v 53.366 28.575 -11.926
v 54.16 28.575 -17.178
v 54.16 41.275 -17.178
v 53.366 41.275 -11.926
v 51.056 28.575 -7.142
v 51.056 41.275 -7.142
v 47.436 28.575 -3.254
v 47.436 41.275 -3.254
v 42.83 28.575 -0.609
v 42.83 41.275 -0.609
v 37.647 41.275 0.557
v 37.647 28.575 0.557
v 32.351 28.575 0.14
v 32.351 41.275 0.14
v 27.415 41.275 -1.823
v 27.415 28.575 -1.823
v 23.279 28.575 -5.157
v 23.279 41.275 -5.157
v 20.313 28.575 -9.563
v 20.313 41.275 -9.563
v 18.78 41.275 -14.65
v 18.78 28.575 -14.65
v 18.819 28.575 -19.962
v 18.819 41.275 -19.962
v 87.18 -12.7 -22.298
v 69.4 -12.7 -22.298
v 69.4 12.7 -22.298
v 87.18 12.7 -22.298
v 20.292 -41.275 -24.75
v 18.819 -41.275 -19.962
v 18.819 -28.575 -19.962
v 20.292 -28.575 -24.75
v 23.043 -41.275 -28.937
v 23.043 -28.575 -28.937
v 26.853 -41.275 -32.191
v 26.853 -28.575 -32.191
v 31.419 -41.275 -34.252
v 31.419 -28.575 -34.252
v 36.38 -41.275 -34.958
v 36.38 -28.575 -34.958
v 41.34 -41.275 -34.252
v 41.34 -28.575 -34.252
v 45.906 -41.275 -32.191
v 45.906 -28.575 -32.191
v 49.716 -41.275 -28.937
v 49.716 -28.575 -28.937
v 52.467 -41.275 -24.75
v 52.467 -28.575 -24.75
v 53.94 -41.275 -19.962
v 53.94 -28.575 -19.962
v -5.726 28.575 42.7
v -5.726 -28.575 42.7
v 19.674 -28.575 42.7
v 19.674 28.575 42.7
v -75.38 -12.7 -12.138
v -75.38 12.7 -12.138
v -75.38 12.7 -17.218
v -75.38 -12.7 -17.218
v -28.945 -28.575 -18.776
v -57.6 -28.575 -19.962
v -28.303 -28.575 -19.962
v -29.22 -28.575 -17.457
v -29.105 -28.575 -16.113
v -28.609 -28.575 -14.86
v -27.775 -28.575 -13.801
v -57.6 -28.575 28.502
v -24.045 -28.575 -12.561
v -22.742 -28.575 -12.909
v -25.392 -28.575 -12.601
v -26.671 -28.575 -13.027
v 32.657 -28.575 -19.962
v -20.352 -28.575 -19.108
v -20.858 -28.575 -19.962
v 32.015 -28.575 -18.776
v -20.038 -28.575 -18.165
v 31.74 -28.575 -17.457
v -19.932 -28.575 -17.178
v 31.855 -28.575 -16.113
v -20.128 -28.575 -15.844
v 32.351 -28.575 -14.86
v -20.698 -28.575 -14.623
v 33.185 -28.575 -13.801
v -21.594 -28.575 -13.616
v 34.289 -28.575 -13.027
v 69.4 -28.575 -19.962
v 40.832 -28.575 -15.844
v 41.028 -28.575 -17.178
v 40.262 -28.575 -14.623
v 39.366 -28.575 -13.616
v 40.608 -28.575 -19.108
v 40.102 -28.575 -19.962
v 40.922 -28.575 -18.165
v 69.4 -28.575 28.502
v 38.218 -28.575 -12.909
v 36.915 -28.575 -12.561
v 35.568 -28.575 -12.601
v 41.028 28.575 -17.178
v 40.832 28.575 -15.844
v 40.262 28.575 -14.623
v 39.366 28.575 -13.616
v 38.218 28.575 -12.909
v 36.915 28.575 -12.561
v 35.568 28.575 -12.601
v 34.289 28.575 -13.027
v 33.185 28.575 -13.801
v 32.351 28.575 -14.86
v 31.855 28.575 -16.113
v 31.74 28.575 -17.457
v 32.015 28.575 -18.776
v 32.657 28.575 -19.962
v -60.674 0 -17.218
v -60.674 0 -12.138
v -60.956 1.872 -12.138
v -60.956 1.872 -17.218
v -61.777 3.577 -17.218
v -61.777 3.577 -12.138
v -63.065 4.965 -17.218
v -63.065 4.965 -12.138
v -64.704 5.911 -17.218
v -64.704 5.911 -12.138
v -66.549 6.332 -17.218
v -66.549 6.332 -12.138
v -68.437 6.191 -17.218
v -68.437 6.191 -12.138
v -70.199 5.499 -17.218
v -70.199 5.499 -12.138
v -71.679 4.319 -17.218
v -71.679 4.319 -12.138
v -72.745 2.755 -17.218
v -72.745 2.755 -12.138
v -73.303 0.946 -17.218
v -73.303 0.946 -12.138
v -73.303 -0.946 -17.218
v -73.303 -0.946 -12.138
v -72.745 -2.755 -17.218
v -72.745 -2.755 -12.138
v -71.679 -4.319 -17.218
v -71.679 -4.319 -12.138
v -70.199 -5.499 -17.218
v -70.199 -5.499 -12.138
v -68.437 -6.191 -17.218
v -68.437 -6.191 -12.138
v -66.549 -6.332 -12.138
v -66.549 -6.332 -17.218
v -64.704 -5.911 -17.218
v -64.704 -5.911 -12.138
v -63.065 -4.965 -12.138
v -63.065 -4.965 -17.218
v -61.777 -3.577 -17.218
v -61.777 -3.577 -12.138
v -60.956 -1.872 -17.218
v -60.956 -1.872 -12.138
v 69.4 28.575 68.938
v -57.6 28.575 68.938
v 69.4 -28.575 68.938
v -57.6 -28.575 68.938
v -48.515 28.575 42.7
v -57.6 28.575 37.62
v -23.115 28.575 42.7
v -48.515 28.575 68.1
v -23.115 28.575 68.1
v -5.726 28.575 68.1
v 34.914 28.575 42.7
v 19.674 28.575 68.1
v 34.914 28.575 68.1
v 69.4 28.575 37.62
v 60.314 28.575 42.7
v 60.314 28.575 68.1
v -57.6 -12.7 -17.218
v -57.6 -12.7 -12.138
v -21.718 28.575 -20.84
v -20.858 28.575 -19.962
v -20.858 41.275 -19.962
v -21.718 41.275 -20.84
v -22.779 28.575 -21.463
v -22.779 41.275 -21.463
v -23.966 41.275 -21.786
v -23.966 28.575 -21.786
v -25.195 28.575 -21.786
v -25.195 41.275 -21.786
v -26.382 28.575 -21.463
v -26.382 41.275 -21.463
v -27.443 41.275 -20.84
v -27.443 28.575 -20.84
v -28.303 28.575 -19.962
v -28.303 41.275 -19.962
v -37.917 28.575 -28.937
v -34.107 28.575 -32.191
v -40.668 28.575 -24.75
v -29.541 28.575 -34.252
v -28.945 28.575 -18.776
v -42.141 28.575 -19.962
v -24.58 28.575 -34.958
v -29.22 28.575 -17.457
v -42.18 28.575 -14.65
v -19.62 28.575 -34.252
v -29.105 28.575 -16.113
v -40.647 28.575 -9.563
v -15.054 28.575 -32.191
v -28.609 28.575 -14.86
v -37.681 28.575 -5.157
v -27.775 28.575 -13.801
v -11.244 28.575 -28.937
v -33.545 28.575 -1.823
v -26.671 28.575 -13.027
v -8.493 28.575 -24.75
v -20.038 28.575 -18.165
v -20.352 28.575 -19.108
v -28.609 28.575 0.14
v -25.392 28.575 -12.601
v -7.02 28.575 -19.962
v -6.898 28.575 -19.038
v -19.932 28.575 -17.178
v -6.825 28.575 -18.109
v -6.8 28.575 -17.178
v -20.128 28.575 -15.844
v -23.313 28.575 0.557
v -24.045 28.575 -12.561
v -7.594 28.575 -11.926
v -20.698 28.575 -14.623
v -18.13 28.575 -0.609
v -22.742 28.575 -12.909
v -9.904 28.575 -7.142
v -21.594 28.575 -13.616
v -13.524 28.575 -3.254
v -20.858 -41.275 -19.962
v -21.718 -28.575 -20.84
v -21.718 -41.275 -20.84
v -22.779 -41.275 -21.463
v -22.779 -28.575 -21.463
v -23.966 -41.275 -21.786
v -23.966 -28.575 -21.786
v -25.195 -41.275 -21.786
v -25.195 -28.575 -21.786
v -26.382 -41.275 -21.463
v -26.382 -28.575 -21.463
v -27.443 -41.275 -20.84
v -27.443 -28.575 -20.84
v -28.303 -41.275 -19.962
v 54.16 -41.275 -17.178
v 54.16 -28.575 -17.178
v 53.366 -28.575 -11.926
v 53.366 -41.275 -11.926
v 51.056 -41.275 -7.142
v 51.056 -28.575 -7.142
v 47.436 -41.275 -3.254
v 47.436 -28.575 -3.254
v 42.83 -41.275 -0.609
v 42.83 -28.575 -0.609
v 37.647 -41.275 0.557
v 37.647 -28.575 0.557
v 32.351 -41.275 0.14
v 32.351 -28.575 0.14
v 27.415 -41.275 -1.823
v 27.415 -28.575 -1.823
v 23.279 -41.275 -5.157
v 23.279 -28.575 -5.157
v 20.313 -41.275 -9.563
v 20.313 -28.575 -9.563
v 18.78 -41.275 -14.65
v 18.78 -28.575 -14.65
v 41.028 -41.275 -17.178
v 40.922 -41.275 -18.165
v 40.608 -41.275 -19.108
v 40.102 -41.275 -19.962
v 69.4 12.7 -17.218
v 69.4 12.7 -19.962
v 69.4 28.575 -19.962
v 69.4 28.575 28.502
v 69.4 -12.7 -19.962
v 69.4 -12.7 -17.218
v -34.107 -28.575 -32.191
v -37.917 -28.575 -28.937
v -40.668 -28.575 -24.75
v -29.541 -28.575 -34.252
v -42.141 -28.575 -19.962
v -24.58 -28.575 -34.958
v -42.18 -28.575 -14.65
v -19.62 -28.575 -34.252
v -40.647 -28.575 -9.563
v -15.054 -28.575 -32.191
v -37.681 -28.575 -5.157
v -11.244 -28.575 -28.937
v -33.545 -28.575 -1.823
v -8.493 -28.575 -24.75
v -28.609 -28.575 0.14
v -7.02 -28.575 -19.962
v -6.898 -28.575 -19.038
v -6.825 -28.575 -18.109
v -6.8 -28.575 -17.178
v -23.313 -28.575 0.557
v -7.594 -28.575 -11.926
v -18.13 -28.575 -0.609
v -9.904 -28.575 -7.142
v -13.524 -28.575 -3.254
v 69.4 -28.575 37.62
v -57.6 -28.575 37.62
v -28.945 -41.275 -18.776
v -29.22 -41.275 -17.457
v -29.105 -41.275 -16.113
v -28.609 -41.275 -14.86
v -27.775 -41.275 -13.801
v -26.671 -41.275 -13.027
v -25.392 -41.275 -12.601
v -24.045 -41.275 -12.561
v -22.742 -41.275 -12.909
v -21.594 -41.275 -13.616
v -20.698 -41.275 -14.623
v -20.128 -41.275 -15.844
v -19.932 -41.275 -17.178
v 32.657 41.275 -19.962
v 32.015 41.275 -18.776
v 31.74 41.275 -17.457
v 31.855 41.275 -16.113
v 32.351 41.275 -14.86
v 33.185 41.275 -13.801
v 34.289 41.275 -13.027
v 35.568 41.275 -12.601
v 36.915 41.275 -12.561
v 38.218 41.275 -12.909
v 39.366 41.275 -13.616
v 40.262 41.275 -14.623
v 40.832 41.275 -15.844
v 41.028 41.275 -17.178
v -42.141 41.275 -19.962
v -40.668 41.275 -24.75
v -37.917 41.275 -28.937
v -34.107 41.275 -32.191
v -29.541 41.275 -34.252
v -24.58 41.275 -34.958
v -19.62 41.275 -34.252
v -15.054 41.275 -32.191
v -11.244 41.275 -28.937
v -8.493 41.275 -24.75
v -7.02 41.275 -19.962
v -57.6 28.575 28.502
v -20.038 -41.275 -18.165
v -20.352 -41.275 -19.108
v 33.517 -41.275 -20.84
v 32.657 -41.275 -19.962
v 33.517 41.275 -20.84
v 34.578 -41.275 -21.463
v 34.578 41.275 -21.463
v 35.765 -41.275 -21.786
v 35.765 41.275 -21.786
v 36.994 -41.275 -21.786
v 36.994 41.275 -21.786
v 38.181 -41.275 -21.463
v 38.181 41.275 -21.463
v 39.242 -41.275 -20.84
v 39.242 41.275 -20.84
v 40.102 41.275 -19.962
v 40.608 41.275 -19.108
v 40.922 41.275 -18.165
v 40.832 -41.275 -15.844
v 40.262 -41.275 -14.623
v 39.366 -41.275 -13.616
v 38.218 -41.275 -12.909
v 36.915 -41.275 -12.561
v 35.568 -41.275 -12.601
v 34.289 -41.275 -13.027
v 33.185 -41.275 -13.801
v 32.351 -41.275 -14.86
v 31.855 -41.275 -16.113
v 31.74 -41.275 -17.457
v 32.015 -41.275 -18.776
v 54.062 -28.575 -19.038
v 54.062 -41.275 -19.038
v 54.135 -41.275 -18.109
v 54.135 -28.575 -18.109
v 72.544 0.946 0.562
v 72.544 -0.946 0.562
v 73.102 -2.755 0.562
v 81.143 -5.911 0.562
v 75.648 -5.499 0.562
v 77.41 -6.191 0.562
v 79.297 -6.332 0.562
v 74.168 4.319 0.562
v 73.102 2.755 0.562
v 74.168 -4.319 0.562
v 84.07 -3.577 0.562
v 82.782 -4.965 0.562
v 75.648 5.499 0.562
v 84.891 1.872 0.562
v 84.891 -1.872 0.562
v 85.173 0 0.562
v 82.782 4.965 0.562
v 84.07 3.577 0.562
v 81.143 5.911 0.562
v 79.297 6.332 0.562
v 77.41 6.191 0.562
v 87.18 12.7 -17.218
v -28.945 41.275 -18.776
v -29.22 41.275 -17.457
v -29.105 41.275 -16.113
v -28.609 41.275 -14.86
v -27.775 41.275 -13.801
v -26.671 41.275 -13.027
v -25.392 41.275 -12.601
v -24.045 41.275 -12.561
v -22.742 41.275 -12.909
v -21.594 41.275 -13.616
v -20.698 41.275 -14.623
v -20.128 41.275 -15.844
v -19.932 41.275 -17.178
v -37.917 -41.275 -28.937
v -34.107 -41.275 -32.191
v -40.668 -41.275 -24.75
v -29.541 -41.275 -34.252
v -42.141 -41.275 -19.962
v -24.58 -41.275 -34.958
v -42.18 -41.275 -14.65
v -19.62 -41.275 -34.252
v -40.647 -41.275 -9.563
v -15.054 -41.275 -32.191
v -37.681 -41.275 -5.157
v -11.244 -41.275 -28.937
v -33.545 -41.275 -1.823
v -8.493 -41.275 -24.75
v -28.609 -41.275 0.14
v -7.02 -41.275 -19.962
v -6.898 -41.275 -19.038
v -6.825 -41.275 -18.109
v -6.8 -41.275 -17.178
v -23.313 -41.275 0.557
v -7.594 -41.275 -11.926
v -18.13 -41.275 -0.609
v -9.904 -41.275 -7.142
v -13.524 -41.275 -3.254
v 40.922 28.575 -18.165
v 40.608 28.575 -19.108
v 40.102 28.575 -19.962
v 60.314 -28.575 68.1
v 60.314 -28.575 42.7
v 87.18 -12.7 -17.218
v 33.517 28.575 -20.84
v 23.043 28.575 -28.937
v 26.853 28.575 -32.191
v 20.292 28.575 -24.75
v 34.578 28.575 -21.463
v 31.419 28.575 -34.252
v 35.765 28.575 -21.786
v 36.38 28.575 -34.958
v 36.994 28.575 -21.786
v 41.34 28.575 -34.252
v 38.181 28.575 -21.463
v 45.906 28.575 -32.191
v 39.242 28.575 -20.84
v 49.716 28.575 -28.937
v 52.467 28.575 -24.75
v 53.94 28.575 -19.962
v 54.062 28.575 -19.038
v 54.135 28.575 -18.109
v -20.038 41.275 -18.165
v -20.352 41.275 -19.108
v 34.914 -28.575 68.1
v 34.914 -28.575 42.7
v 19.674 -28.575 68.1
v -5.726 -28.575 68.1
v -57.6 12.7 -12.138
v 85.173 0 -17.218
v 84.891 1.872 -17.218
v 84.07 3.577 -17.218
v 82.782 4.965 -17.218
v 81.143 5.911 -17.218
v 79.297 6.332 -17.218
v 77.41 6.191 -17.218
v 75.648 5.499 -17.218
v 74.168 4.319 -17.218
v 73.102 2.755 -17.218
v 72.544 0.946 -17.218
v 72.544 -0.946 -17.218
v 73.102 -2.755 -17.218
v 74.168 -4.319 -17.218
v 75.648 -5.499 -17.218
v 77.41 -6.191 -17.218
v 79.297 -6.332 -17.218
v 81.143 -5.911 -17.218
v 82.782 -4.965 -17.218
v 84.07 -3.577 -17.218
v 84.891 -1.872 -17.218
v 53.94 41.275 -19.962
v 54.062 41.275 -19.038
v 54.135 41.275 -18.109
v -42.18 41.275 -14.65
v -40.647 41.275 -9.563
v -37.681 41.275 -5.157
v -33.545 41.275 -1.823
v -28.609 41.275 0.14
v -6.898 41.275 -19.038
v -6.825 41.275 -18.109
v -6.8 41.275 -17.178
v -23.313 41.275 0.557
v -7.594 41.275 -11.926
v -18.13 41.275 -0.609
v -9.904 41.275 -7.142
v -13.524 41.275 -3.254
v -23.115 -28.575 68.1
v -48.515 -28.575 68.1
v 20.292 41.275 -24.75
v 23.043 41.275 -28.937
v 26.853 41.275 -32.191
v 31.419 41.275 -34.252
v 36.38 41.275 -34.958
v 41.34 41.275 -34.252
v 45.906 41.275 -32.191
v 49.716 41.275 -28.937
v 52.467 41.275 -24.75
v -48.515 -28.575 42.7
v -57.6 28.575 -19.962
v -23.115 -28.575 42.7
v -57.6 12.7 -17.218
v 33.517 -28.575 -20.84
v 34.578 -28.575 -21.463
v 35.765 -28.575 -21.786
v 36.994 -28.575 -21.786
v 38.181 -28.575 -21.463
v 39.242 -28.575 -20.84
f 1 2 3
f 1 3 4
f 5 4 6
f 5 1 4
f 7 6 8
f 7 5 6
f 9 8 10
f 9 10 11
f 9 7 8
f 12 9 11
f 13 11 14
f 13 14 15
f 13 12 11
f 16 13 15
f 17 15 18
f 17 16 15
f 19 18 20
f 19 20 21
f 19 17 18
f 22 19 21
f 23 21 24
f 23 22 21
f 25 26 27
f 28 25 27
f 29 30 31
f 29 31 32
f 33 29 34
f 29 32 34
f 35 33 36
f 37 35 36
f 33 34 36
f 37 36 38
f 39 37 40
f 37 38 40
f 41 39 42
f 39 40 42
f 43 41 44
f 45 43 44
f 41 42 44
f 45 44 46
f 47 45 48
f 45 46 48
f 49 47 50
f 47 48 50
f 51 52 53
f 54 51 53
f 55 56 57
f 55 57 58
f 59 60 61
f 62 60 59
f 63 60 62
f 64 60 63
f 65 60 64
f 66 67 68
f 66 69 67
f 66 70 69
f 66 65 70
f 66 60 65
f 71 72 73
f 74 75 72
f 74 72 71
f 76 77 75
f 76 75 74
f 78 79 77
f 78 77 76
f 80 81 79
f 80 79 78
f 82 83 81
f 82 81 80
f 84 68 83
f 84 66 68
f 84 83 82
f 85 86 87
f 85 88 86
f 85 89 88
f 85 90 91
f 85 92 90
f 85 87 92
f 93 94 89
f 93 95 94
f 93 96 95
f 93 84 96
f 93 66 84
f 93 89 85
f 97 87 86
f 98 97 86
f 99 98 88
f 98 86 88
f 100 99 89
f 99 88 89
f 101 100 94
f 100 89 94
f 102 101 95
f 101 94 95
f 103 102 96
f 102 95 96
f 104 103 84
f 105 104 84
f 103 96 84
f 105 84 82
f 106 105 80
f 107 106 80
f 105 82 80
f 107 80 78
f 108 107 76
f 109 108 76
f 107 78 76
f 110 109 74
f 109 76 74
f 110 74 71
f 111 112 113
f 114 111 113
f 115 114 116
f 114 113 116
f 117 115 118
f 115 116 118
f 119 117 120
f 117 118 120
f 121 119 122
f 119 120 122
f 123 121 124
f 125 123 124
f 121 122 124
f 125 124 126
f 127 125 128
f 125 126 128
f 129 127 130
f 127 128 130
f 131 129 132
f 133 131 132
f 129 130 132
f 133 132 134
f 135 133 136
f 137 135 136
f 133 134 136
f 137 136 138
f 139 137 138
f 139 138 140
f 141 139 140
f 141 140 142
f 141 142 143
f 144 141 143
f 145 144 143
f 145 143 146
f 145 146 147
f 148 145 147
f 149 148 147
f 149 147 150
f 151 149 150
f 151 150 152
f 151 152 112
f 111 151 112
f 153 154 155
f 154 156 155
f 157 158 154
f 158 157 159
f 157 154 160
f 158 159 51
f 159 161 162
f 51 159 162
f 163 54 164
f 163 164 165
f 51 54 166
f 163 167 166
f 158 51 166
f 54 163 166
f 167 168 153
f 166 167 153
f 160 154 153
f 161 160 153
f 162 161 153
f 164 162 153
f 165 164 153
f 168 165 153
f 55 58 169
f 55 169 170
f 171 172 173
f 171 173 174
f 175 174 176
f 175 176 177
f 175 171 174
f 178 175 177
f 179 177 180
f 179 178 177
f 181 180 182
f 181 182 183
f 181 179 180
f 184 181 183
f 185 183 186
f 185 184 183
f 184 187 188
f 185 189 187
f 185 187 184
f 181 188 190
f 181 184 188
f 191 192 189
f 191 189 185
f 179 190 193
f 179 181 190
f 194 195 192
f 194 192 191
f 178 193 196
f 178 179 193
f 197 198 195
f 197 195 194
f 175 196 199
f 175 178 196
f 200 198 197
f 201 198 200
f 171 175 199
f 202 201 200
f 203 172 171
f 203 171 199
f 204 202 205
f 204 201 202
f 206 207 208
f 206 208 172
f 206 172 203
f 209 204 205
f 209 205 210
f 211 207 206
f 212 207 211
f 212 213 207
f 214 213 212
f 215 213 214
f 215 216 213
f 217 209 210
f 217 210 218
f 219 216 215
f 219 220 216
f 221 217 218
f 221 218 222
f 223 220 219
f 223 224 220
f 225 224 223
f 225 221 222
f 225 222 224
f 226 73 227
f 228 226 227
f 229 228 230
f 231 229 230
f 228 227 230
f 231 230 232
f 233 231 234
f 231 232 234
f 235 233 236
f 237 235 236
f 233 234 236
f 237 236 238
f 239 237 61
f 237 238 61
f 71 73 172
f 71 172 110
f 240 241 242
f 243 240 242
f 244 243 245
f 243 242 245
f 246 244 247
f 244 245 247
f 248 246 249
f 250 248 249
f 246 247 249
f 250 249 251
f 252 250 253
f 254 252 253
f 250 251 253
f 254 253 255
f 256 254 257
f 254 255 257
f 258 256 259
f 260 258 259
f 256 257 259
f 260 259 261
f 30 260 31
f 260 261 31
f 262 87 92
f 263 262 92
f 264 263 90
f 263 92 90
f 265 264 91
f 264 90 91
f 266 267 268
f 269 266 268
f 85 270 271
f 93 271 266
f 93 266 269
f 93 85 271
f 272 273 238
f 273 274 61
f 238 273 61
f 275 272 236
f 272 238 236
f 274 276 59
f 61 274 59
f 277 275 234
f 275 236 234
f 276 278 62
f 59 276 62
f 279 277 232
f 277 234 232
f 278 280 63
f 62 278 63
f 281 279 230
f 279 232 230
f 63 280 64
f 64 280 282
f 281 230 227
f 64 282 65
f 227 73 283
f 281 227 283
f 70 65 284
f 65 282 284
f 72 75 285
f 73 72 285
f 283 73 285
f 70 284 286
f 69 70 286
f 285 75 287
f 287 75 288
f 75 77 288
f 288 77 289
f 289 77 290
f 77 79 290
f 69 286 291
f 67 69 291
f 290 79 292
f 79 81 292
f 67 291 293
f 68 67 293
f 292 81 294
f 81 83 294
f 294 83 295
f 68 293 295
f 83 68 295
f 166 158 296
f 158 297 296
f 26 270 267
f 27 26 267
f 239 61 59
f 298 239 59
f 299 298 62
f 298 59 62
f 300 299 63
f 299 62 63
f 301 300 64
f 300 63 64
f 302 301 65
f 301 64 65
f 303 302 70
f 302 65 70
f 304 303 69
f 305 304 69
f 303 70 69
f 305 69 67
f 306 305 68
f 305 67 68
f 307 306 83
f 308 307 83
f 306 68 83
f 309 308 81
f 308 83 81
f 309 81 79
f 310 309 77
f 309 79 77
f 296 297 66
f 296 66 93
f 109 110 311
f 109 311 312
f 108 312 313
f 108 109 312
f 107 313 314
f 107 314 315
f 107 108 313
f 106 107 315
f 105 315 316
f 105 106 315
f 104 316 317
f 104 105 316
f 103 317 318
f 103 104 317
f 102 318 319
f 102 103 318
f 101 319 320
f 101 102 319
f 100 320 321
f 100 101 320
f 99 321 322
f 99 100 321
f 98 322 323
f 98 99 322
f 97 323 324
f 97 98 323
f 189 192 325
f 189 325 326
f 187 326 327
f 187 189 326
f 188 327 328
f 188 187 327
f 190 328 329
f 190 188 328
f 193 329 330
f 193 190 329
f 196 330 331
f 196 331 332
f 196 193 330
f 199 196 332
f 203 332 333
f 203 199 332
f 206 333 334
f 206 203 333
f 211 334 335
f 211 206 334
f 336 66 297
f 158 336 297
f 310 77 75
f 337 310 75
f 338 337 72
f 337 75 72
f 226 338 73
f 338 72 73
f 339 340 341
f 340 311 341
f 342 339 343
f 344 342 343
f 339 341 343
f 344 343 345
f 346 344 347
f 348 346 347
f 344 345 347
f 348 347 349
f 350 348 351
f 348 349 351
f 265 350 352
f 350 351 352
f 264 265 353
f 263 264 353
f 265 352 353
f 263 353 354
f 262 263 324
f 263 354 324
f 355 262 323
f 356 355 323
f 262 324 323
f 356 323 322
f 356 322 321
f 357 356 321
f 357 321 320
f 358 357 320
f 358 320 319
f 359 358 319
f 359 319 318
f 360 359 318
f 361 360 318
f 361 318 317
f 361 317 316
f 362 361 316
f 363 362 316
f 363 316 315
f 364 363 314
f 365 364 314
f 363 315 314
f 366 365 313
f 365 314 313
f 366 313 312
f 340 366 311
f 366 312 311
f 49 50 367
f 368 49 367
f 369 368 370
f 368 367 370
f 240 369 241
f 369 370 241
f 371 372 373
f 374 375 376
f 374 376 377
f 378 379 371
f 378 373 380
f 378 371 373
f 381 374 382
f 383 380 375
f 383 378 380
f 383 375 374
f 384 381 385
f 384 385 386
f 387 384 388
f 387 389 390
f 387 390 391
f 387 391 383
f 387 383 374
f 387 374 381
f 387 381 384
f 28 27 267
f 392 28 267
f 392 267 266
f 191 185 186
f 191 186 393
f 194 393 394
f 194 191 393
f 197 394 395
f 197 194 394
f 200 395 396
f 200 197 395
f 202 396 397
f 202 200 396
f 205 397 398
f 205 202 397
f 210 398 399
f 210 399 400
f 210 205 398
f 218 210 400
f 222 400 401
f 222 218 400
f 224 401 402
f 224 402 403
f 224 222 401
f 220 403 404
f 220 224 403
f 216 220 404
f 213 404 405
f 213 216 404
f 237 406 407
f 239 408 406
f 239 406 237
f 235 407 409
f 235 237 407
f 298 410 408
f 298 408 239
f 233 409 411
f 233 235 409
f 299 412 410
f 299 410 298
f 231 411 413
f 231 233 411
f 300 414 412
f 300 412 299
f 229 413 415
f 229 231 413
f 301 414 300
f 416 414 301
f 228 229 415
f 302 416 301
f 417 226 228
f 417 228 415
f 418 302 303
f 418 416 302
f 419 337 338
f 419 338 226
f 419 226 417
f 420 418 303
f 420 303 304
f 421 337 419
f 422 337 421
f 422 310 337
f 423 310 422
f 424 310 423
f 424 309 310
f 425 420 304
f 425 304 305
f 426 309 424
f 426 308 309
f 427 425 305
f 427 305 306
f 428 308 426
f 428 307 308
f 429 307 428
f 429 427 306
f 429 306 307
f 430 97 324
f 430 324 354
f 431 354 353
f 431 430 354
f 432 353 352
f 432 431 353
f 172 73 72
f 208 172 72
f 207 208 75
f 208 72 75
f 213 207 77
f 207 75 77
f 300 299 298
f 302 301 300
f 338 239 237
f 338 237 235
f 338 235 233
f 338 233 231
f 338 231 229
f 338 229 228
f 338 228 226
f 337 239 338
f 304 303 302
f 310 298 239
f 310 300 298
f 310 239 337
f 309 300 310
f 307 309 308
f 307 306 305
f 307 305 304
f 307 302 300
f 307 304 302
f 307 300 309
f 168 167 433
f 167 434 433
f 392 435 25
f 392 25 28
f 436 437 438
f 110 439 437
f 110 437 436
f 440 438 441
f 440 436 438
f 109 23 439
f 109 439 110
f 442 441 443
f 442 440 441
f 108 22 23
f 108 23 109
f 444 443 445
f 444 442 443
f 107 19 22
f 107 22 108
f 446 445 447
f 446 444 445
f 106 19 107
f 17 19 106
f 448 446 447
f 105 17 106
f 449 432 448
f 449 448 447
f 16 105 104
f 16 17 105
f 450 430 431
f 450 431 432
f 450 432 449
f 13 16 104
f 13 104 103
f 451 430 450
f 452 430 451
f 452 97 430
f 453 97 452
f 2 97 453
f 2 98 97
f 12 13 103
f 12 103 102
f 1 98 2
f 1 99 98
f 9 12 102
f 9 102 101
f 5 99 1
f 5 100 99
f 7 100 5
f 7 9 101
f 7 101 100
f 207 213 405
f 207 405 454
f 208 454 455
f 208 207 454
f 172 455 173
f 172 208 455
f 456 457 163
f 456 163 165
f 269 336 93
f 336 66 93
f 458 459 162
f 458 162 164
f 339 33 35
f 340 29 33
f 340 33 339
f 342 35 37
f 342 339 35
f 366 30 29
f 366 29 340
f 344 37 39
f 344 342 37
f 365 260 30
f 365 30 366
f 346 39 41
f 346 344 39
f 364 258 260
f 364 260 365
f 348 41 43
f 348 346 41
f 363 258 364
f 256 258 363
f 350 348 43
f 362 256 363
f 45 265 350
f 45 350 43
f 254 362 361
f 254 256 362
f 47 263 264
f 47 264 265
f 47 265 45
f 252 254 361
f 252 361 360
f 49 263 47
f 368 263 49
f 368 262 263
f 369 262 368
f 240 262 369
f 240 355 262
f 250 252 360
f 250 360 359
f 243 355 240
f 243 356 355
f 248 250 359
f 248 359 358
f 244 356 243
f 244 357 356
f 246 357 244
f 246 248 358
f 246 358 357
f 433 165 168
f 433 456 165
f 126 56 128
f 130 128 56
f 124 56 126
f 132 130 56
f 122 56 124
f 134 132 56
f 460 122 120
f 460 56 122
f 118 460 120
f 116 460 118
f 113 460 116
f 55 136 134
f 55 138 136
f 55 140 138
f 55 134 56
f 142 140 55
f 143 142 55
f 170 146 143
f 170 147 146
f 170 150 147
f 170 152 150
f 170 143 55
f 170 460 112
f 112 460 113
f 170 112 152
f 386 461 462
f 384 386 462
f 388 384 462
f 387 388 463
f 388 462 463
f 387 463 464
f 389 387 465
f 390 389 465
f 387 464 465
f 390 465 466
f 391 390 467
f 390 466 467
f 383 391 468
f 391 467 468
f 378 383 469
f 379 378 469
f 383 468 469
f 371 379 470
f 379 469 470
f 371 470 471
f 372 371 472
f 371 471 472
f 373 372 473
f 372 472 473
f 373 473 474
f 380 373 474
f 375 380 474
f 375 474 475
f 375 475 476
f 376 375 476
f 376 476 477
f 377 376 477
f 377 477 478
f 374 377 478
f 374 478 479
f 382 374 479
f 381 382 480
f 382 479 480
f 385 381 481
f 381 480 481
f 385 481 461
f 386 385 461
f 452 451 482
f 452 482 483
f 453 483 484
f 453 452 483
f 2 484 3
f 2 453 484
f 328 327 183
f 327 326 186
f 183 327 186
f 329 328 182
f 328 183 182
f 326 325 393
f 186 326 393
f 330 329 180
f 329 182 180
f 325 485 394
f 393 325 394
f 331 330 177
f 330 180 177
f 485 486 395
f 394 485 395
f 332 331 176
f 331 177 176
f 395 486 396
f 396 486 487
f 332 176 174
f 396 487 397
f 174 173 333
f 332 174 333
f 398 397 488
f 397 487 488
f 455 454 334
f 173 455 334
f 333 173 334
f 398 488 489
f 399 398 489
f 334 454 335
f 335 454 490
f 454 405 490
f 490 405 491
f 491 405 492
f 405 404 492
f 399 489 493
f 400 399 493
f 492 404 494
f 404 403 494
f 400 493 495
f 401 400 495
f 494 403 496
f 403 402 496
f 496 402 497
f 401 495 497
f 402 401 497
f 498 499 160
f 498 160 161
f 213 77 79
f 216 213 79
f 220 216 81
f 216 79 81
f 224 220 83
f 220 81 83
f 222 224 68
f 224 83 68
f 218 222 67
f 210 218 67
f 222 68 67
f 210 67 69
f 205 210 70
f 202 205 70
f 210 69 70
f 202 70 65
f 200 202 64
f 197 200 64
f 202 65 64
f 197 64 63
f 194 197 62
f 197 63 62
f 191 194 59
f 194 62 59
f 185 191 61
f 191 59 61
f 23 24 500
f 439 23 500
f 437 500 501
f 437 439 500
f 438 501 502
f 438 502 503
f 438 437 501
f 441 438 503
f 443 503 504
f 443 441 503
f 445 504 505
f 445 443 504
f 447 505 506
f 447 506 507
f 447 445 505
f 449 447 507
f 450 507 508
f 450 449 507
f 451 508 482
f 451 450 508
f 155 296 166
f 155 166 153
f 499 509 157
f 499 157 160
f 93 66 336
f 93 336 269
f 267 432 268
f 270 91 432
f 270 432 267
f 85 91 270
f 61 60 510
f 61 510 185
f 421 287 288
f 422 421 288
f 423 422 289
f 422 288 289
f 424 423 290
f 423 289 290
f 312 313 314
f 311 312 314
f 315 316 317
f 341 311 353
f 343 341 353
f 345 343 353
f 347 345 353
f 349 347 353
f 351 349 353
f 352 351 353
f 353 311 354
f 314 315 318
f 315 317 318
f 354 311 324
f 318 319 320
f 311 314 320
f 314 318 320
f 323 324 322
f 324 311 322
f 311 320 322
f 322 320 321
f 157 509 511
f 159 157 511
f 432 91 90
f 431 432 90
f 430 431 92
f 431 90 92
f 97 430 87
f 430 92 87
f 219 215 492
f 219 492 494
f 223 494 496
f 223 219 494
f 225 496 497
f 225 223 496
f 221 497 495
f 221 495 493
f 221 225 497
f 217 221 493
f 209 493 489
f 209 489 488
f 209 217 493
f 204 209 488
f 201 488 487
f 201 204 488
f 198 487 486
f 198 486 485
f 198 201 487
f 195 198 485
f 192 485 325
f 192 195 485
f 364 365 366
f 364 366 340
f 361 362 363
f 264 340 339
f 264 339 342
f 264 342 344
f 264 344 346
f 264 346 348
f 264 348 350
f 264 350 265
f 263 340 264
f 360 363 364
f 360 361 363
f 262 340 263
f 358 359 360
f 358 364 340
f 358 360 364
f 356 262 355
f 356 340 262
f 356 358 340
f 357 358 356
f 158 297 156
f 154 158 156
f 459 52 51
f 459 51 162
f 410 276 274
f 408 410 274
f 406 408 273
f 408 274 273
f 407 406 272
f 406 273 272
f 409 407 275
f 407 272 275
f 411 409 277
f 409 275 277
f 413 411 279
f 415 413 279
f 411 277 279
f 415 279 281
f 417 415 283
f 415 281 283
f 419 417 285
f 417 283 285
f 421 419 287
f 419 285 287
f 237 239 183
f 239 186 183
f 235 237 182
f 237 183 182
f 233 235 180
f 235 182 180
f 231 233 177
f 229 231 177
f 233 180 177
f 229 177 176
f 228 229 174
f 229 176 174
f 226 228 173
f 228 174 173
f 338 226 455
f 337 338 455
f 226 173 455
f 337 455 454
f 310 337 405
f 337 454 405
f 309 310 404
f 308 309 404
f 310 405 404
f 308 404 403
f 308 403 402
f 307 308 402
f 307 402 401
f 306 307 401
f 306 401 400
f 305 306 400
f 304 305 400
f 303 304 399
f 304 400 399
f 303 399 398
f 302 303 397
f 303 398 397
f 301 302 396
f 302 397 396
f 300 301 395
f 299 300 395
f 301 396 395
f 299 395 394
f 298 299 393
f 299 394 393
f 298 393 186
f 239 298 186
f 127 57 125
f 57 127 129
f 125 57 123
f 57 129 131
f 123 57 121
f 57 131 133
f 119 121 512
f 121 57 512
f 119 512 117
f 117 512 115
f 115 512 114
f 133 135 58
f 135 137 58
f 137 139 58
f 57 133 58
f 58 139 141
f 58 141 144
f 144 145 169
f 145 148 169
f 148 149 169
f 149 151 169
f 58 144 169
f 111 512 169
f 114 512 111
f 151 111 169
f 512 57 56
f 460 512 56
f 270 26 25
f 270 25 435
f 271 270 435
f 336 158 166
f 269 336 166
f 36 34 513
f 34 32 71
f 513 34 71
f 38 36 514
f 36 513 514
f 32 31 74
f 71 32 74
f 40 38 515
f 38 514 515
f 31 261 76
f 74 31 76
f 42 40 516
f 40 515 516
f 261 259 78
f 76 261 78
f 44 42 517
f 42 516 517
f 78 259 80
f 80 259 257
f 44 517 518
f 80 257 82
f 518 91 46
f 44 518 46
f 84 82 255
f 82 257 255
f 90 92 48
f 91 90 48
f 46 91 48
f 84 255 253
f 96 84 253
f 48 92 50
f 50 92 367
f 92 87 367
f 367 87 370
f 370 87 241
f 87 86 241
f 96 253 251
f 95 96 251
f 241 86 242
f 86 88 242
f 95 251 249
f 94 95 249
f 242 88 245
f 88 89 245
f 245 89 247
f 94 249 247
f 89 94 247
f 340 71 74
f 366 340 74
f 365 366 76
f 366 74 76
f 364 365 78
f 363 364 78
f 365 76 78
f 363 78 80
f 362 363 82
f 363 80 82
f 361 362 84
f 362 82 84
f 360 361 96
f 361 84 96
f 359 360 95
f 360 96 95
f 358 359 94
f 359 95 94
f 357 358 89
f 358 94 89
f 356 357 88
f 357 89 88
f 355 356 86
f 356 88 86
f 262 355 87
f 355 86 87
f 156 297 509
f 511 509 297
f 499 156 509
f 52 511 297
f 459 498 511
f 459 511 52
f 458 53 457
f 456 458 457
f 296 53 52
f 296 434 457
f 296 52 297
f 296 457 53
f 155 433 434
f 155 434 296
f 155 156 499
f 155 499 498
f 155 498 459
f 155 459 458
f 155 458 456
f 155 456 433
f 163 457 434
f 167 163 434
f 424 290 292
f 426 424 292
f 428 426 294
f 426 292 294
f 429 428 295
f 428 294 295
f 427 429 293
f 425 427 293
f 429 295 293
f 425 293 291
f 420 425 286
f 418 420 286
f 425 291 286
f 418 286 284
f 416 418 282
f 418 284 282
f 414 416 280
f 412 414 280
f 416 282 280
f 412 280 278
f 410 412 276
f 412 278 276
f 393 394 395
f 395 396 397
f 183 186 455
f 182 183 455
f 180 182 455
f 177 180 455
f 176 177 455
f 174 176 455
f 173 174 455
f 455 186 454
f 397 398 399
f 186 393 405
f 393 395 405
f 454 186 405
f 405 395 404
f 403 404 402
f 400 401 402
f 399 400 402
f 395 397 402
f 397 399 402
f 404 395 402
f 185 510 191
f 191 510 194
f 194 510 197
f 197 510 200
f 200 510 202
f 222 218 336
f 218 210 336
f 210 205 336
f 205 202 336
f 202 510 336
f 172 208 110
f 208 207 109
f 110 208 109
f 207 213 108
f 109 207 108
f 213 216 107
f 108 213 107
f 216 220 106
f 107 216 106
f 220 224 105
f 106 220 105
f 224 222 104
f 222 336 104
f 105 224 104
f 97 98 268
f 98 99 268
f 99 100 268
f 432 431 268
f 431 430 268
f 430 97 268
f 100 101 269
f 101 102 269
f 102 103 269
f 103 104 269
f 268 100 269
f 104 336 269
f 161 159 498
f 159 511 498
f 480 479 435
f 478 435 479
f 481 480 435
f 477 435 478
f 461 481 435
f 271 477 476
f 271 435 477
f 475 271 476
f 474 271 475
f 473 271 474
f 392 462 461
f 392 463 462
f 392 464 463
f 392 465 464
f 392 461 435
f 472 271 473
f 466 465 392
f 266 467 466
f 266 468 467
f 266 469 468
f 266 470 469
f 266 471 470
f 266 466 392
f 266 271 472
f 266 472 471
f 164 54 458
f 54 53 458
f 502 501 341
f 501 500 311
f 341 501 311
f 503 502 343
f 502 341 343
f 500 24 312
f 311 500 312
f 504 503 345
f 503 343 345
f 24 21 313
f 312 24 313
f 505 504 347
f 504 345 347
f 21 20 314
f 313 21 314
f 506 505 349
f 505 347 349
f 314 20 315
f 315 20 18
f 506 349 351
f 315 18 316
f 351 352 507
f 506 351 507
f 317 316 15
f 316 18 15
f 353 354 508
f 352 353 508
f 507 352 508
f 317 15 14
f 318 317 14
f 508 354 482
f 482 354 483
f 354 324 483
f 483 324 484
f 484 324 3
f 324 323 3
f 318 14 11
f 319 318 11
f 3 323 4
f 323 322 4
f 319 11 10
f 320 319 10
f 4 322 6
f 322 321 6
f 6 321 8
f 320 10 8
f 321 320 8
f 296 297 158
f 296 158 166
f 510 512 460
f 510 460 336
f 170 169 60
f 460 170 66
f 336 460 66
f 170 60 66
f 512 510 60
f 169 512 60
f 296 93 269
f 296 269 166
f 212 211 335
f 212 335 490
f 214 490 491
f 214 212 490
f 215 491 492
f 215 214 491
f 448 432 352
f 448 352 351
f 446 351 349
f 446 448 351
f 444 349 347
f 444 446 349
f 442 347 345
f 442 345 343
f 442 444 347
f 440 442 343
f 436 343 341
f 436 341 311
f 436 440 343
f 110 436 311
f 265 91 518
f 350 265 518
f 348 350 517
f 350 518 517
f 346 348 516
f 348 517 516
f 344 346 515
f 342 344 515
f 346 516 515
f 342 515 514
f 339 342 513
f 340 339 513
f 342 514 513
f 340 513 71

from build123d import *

# Parameters (mm, degrees)
F0_W          = 127
F0_H          = 31.3182
F0_W_2        = 25.4
F0_H_2        = 25.4
F1_DEPTH      = 28.575
F0_H_3        = 48.4632
F0_H_4        = 9.1186
F2_DEPTH      = 28.575
F4_DEPTH      = 12.7
F6_DEPTH      = 23.114
F7_DEPTH      = 82.804
F7_DEPTH_BACK = 76.2
F8_DEPTH      = 69.85
F8_DEPTH_BACK = 12.7
F9_W          = 25.4
F9_H          = 5.08
F10_DEPTH     = 17.78
F11_R         = 6.35
F12_DEPTH     = 17.78
F13_W         = 25.4
F13_H         = 5.08
F14_DEPTH     = 17.78
F15_R         = 6.35
F16_DEPTH     = 25.4


with BuildPart() as f1:
    # F0 (on Front) → F1 (new body, symmetric)
    with BuildSketch(Plane.XZ):
        with Locations((5.8995515195, 53.2792696041)):
            Rectangle(F0_W, F0_H)
        with Locations((-35.8146865249, 55.4001696041)):
            Rectangle(F0_W_2, F0_H_2, mode=Mode.SUBTRACT)
        with Locations((6.9737978751, 55.4001696041)):
            Rectangle(F0_W_2, F0_H_2, mode=Mode.SUBTRACT)
        with Locations((47.6137937195, 55.4001696041)):
            Rectangle(F0_W_2, F0_H_2, mode=Mode.SUBTRACT)
    extrude(amount=F1_DEPTH, both=True)

    # F3 (on face) → F6 (cut)
    with BuildSketch(Plane.XZ.offset(28.575)):
        with BuildLine():
            Line((-28.3030916435, -19.9616303959), (-42.1412203564, -19.9616303959))
            ThreePointArc((-42.1412203564, -19.9616303959), (-24.5804484805, -34.9581629324), (-7.0196766045, -19.9616303959))
            Line((-7.0196766045, -19.9616303959), (-20.8578053174, -19.9616303959))
            ThreePointArc((-20.8578053174, -19.9616303959), (-24.5804484805, -21.8263629324), (-28.3030916435, -19.9616303959))
        make_face()
        with BuildLine():
            Line((32.6569083565, -19.9616303959), (18.8187796436, -19.9616303959))
            ThreePointArc((18.8187796436, -19.9616303959), (36.3795515195, -34.9581629324), (53.9403233955, -19.9616303959))
            Line((53.9403233955, -19.9616303959), (40.1021946826, -19.9616303959))
            ThreePointArc((40.1021946826, -19.9616303959), (36.3795515195, -21.8263629324), (32.6569083565, -19.9616303959))
        make_face()
    extrude(amount=-F6_DEPTH, mode=Mode.SUBTRACT)


with BuildPart() as f1b:
    # F0 (on Front) → F1, piece 2 (new body, symmetric)
    with BuildSketch(Plane.XZ):
        with Locations((5.8995515195, 4.2699696041)):
            Rectangle(F0_W, F0_H_3)
    extrude(amount=F1_DEPTH, both=True)

    # F3 (on face) → F7 (cut, two sides)
    with BuildSketch(Plane.XZ.offset(28.575)) as f7_sk:
        with BuildLine():
            Line((40.1021946826, -19.9616303959), (32.6569083565, -19.9616303959))
            ThreePointArc((32.6569083565, -19.9616303959), (36.3795515195, -21.8263629324), (40.1021946826, -19.9616303959))
        make_face()
        with BuildLine():
            ThreePointArc((41.0277515195, -17.1781629324), (34.9128931937, -12.7674173497), (32.6569083565, -19.9616303959))
            Line((32.6569083565, -19.9616303959), (40.1021946826, -19.9616303959))
            ThreePointArc((40.1021946826, -19.9616303959), (40.7902971022, -18.6448212582), (41.0277515195, -17.1781629324))
        make_face()
        with BuildLine():
            Line((-20.8578053174, -19.9616303959), (-28.3030916435, -19.9616303959))
            ThreePointArc((-28.3030916435, -19.9616303959), (-24.5804484805, -21.8263629324), (-20.8578053174, -19.9616303959))
        make_face()
        with BuildLine():
            ThreePointArc((-19.9322484805, -17.1781629324), (-26.0471068063, -12.7674173497), (-28.3030916435, -19.9616303959))
            Line((-28.3030916435, -19.9616303959), (-20.8578053174, -19.9616303959))
            ThreePointArc((-20.8578053174, -19.9616303959), (-20.1697028978, -18.6448212582), (-19.9322484805, -17.1781629324))
        make_face()
    extrude(amount=-F7_DEPTH, mode=Mode.SUBTRACT)
    extrude(f7_sk.sketch, amount=F7_DEPTH_BACK, mode=Mode.SUBTRACT)

    # F9 (on face) → F10 (join)
    with BuildSketch(Plane.YZ.offset(69.3995515195)):
        with Locations((0, -19.7584303959)):
            Rectangle(F9_W, F9_H)
    extrude(amount=F10_DEPTH)

    # F11 (on face) → F12 (join)
    with BuildSketch(Plane.XY.offset(-17.2184303959)):
        with Locations((78.8229515195, 0)):
            Circle(F11_R)
    extrude(amount=F12_DEPTH)

    # F13 (on face) → F14 (join)
    with BuildSketch(Plane(origin=(-57.6004484805, 0, 0), x_dir=(0, -1, 0), z_dir=(-1, 0, 0))):
        with Locations((0, -14.6784303959)):
            Rectangle(F13_W, F13_H)
    extrude(amount=F14_DEPTH)

    # F15 (on face) → F16 (cut)
    with BuildSketch(Plane.XY.offset(-12.1384303959)):
        with Locations((-67.0238484805, 0)):
            Circle(F15_R)
    extrude(amount=-F16_DEPTH, mode=Mode.SUBTRACT)


with BuildPart() as f2:
    # F0 (on Front) → F2 (new body, symmetric)
    with BuildSketch(Plane.XZ):
        with Locations((5.8995515195, 33.0608696041)):
            Rectangle(F0_W, F0_H_4)
    extrude(amount=F2_DEPTH, both=True)


with BuildPart() as f4:
    # F3 (on face) → F4 (new body)
    with BuildSketch(Plane.XZ.offset(28.575)):
        with BuildLine():
            Line((-28.3030916435, -19.9616303959), (-42.1412203564, -19.9616303959))
            ThreePointArc((-42.1412203564, -19.9616303959), (-24.5804484805, -34.9581629324), (-7.0196766045, -19.9616303959))
            Line((-7.0196766045, -19.9616303959), (-20.8578053174, -19.9616303959))
            ThreePointArc((-20.8578053174, -19.9616303959), (-24.5804484805, -21.8263629324), (-28.3030916435, -19.9616303959))
        make_face()
        with BuildLine():
            ThreePointArc((-7.0196766045, -19.9616303959), (-6.8553402445, -18.5742066361), (-6.8004484805, -17.1781629324))
            ThreePointArc((-6.8004484805, -17.1781629324), (-25.9764921842, 0.5469453036), (-42.1412203564, -19.9616303959))
            Line((-42.1412203564, -19.9616303959), (-28.3030916435, -19.9616303959))
            ThreePointArc((-28.3030916435, -19.9616303959), (-26.0471068063, -12.7674173497), (-19.9322484805, -17.1781629324))
            ThreePointArc((-19.9322484805, -17.1781629324), (-20.1697028978, -18.6448212582), (-20.8578053174, -19.9616303959))
            Line((-20.8578053174, -19.9616303959), (-7.0196766045, -19.9616303959))
        make_face()
    extrude(amount=F4_DEPTH)


with BuildPart() as f4b:
    # F3 (on face) → F4, piece 2 (new body)
    with BuildSketch(Plane.XZ.offset(28.575)):
        with BuildLine():
            Line((32.6569083565, -19.9616303959), (18.8187796436, -19.9616303959))
            ThreePointArc((18.8187796436, -19.9616303959), (36.3795515195, -34.9581629324), (53.9403233955, -19.9616303959))
            Line((53.9403233955, -19.9616303959), (40.1021946826, -19.9616303959))
            ThreePointArc((40.1021946826, -19.9616303959), (36.3795515195, -21.8263629324), (32.6569083565, -19.9616303959))
        make_face()
        with BuildLine():
            ThreePointArc((54.1595515195, -17.1781629324), (34.9835078158, 0.5469453036), (18.8187796436, -19.9616303959))
            Line((18.8187796436, -19.9616303959), (32.6569083565, -19.9616303959))
            ThreePointArc((32.6569083565, -19.9616303959), (34.9128931937, -12.7674173497), (41.0277515195, -17.1781629324))
            ThreePointArc((41.0277515195, -17.1781629324), (40.7902971022, -18.6448212582), (40.1021946826, -19.9616303959))
            Line((40.1021946826, -19.9616303959), (53.9403233955, -19.9616303959))
            ThreePointArc((53.9403233955, -19.9616303959), (54.1046597555, -18.5742066361), (54.1595515195, -17.1781629324))
        make_face()
    extrude(amount=F4_DEPTH)


with BuildPart() as f5_1:
    # F5: instance of F4
    add(f4.part.mirror(Plane.XZ))


with BuildPart() as f5_2:
    # F5: instance of F4b
    add(f4b.part.mirror(Plane.XZ))


with BuildPart() as f8:
    # F3 (on face) → F8 (new body, two sides)
    with BuildSketch(Plane.XZ.offset(28.575)) as f8_sk:
        with BuildLine():
            Line((-20.8578053174, -19.9616303959), (-28.3030916435, -19.9616303959))
            ThreePointArc((-28.3030916435, -19.9616303959), (-24.5804484805, -21.8263629324), (-20.8578053174, -19.9616303959))
        make_face()
        with BuildLine():
            ThreePointArc((-19.9322484805, -17.1781629324), (-26.0471068063, -12.7674173497), (-28.3030916435, -19.9616303959))
            Line((-28.3030916435, -19.9616303959), (-20.8578053174, -19.9616303959))
            ThreePointArc((-20.8578053174, -19.9616303959), (-20.1697028978, -18.6448212582), (-19.9322484805, -17.1781629324))
        make_face()
    extrude(amount=-F8_DEPTH)
    extrude(f8_sk.sketch, amount=F8_DEPTH_BACK)


with BuildPart() as f8b:
    # F3 (on face) → F8, piece 2 (new body, two sides)
    with BuildSketch(Plane.XZ.offset(28.575)) as f8_2_sk:
        with BuildLine():
            Line((40.1021946826, -19.9616303959), (32.6569083565, -19.9616303959))
            ThreePointArc((32.6569083565, -19.9616303959), (36.3795515195, -21.8263629324), (40.1021946826, -19.9616303959))
        make_face()
        with BuildLine():
            ThreePointArc((41.0277515195, -17.1781629324), (34.9128931937, -12.7674173497), (32.6569083565, -19.9616303959))
            Line((32.6569083565, -19.9616303959), (40.1021946826, -19.9616303959))
            ThreePointArc((40.1021946826, -19.9616303959), (40.7902971022, -18.6448212582), (41.0277515195, -17.1781629324))
        make_face()
    extrude(amount=-F8_DEPTH)
    extrude(f8_2_sk.sketch, amount=F8_DEPTH_BACK)


solid = Compound([f1.part, f1b.part, f2.part, f4.part, f4b.part, f5_1.part, f5_2.part, f8.part, f8b.part])
